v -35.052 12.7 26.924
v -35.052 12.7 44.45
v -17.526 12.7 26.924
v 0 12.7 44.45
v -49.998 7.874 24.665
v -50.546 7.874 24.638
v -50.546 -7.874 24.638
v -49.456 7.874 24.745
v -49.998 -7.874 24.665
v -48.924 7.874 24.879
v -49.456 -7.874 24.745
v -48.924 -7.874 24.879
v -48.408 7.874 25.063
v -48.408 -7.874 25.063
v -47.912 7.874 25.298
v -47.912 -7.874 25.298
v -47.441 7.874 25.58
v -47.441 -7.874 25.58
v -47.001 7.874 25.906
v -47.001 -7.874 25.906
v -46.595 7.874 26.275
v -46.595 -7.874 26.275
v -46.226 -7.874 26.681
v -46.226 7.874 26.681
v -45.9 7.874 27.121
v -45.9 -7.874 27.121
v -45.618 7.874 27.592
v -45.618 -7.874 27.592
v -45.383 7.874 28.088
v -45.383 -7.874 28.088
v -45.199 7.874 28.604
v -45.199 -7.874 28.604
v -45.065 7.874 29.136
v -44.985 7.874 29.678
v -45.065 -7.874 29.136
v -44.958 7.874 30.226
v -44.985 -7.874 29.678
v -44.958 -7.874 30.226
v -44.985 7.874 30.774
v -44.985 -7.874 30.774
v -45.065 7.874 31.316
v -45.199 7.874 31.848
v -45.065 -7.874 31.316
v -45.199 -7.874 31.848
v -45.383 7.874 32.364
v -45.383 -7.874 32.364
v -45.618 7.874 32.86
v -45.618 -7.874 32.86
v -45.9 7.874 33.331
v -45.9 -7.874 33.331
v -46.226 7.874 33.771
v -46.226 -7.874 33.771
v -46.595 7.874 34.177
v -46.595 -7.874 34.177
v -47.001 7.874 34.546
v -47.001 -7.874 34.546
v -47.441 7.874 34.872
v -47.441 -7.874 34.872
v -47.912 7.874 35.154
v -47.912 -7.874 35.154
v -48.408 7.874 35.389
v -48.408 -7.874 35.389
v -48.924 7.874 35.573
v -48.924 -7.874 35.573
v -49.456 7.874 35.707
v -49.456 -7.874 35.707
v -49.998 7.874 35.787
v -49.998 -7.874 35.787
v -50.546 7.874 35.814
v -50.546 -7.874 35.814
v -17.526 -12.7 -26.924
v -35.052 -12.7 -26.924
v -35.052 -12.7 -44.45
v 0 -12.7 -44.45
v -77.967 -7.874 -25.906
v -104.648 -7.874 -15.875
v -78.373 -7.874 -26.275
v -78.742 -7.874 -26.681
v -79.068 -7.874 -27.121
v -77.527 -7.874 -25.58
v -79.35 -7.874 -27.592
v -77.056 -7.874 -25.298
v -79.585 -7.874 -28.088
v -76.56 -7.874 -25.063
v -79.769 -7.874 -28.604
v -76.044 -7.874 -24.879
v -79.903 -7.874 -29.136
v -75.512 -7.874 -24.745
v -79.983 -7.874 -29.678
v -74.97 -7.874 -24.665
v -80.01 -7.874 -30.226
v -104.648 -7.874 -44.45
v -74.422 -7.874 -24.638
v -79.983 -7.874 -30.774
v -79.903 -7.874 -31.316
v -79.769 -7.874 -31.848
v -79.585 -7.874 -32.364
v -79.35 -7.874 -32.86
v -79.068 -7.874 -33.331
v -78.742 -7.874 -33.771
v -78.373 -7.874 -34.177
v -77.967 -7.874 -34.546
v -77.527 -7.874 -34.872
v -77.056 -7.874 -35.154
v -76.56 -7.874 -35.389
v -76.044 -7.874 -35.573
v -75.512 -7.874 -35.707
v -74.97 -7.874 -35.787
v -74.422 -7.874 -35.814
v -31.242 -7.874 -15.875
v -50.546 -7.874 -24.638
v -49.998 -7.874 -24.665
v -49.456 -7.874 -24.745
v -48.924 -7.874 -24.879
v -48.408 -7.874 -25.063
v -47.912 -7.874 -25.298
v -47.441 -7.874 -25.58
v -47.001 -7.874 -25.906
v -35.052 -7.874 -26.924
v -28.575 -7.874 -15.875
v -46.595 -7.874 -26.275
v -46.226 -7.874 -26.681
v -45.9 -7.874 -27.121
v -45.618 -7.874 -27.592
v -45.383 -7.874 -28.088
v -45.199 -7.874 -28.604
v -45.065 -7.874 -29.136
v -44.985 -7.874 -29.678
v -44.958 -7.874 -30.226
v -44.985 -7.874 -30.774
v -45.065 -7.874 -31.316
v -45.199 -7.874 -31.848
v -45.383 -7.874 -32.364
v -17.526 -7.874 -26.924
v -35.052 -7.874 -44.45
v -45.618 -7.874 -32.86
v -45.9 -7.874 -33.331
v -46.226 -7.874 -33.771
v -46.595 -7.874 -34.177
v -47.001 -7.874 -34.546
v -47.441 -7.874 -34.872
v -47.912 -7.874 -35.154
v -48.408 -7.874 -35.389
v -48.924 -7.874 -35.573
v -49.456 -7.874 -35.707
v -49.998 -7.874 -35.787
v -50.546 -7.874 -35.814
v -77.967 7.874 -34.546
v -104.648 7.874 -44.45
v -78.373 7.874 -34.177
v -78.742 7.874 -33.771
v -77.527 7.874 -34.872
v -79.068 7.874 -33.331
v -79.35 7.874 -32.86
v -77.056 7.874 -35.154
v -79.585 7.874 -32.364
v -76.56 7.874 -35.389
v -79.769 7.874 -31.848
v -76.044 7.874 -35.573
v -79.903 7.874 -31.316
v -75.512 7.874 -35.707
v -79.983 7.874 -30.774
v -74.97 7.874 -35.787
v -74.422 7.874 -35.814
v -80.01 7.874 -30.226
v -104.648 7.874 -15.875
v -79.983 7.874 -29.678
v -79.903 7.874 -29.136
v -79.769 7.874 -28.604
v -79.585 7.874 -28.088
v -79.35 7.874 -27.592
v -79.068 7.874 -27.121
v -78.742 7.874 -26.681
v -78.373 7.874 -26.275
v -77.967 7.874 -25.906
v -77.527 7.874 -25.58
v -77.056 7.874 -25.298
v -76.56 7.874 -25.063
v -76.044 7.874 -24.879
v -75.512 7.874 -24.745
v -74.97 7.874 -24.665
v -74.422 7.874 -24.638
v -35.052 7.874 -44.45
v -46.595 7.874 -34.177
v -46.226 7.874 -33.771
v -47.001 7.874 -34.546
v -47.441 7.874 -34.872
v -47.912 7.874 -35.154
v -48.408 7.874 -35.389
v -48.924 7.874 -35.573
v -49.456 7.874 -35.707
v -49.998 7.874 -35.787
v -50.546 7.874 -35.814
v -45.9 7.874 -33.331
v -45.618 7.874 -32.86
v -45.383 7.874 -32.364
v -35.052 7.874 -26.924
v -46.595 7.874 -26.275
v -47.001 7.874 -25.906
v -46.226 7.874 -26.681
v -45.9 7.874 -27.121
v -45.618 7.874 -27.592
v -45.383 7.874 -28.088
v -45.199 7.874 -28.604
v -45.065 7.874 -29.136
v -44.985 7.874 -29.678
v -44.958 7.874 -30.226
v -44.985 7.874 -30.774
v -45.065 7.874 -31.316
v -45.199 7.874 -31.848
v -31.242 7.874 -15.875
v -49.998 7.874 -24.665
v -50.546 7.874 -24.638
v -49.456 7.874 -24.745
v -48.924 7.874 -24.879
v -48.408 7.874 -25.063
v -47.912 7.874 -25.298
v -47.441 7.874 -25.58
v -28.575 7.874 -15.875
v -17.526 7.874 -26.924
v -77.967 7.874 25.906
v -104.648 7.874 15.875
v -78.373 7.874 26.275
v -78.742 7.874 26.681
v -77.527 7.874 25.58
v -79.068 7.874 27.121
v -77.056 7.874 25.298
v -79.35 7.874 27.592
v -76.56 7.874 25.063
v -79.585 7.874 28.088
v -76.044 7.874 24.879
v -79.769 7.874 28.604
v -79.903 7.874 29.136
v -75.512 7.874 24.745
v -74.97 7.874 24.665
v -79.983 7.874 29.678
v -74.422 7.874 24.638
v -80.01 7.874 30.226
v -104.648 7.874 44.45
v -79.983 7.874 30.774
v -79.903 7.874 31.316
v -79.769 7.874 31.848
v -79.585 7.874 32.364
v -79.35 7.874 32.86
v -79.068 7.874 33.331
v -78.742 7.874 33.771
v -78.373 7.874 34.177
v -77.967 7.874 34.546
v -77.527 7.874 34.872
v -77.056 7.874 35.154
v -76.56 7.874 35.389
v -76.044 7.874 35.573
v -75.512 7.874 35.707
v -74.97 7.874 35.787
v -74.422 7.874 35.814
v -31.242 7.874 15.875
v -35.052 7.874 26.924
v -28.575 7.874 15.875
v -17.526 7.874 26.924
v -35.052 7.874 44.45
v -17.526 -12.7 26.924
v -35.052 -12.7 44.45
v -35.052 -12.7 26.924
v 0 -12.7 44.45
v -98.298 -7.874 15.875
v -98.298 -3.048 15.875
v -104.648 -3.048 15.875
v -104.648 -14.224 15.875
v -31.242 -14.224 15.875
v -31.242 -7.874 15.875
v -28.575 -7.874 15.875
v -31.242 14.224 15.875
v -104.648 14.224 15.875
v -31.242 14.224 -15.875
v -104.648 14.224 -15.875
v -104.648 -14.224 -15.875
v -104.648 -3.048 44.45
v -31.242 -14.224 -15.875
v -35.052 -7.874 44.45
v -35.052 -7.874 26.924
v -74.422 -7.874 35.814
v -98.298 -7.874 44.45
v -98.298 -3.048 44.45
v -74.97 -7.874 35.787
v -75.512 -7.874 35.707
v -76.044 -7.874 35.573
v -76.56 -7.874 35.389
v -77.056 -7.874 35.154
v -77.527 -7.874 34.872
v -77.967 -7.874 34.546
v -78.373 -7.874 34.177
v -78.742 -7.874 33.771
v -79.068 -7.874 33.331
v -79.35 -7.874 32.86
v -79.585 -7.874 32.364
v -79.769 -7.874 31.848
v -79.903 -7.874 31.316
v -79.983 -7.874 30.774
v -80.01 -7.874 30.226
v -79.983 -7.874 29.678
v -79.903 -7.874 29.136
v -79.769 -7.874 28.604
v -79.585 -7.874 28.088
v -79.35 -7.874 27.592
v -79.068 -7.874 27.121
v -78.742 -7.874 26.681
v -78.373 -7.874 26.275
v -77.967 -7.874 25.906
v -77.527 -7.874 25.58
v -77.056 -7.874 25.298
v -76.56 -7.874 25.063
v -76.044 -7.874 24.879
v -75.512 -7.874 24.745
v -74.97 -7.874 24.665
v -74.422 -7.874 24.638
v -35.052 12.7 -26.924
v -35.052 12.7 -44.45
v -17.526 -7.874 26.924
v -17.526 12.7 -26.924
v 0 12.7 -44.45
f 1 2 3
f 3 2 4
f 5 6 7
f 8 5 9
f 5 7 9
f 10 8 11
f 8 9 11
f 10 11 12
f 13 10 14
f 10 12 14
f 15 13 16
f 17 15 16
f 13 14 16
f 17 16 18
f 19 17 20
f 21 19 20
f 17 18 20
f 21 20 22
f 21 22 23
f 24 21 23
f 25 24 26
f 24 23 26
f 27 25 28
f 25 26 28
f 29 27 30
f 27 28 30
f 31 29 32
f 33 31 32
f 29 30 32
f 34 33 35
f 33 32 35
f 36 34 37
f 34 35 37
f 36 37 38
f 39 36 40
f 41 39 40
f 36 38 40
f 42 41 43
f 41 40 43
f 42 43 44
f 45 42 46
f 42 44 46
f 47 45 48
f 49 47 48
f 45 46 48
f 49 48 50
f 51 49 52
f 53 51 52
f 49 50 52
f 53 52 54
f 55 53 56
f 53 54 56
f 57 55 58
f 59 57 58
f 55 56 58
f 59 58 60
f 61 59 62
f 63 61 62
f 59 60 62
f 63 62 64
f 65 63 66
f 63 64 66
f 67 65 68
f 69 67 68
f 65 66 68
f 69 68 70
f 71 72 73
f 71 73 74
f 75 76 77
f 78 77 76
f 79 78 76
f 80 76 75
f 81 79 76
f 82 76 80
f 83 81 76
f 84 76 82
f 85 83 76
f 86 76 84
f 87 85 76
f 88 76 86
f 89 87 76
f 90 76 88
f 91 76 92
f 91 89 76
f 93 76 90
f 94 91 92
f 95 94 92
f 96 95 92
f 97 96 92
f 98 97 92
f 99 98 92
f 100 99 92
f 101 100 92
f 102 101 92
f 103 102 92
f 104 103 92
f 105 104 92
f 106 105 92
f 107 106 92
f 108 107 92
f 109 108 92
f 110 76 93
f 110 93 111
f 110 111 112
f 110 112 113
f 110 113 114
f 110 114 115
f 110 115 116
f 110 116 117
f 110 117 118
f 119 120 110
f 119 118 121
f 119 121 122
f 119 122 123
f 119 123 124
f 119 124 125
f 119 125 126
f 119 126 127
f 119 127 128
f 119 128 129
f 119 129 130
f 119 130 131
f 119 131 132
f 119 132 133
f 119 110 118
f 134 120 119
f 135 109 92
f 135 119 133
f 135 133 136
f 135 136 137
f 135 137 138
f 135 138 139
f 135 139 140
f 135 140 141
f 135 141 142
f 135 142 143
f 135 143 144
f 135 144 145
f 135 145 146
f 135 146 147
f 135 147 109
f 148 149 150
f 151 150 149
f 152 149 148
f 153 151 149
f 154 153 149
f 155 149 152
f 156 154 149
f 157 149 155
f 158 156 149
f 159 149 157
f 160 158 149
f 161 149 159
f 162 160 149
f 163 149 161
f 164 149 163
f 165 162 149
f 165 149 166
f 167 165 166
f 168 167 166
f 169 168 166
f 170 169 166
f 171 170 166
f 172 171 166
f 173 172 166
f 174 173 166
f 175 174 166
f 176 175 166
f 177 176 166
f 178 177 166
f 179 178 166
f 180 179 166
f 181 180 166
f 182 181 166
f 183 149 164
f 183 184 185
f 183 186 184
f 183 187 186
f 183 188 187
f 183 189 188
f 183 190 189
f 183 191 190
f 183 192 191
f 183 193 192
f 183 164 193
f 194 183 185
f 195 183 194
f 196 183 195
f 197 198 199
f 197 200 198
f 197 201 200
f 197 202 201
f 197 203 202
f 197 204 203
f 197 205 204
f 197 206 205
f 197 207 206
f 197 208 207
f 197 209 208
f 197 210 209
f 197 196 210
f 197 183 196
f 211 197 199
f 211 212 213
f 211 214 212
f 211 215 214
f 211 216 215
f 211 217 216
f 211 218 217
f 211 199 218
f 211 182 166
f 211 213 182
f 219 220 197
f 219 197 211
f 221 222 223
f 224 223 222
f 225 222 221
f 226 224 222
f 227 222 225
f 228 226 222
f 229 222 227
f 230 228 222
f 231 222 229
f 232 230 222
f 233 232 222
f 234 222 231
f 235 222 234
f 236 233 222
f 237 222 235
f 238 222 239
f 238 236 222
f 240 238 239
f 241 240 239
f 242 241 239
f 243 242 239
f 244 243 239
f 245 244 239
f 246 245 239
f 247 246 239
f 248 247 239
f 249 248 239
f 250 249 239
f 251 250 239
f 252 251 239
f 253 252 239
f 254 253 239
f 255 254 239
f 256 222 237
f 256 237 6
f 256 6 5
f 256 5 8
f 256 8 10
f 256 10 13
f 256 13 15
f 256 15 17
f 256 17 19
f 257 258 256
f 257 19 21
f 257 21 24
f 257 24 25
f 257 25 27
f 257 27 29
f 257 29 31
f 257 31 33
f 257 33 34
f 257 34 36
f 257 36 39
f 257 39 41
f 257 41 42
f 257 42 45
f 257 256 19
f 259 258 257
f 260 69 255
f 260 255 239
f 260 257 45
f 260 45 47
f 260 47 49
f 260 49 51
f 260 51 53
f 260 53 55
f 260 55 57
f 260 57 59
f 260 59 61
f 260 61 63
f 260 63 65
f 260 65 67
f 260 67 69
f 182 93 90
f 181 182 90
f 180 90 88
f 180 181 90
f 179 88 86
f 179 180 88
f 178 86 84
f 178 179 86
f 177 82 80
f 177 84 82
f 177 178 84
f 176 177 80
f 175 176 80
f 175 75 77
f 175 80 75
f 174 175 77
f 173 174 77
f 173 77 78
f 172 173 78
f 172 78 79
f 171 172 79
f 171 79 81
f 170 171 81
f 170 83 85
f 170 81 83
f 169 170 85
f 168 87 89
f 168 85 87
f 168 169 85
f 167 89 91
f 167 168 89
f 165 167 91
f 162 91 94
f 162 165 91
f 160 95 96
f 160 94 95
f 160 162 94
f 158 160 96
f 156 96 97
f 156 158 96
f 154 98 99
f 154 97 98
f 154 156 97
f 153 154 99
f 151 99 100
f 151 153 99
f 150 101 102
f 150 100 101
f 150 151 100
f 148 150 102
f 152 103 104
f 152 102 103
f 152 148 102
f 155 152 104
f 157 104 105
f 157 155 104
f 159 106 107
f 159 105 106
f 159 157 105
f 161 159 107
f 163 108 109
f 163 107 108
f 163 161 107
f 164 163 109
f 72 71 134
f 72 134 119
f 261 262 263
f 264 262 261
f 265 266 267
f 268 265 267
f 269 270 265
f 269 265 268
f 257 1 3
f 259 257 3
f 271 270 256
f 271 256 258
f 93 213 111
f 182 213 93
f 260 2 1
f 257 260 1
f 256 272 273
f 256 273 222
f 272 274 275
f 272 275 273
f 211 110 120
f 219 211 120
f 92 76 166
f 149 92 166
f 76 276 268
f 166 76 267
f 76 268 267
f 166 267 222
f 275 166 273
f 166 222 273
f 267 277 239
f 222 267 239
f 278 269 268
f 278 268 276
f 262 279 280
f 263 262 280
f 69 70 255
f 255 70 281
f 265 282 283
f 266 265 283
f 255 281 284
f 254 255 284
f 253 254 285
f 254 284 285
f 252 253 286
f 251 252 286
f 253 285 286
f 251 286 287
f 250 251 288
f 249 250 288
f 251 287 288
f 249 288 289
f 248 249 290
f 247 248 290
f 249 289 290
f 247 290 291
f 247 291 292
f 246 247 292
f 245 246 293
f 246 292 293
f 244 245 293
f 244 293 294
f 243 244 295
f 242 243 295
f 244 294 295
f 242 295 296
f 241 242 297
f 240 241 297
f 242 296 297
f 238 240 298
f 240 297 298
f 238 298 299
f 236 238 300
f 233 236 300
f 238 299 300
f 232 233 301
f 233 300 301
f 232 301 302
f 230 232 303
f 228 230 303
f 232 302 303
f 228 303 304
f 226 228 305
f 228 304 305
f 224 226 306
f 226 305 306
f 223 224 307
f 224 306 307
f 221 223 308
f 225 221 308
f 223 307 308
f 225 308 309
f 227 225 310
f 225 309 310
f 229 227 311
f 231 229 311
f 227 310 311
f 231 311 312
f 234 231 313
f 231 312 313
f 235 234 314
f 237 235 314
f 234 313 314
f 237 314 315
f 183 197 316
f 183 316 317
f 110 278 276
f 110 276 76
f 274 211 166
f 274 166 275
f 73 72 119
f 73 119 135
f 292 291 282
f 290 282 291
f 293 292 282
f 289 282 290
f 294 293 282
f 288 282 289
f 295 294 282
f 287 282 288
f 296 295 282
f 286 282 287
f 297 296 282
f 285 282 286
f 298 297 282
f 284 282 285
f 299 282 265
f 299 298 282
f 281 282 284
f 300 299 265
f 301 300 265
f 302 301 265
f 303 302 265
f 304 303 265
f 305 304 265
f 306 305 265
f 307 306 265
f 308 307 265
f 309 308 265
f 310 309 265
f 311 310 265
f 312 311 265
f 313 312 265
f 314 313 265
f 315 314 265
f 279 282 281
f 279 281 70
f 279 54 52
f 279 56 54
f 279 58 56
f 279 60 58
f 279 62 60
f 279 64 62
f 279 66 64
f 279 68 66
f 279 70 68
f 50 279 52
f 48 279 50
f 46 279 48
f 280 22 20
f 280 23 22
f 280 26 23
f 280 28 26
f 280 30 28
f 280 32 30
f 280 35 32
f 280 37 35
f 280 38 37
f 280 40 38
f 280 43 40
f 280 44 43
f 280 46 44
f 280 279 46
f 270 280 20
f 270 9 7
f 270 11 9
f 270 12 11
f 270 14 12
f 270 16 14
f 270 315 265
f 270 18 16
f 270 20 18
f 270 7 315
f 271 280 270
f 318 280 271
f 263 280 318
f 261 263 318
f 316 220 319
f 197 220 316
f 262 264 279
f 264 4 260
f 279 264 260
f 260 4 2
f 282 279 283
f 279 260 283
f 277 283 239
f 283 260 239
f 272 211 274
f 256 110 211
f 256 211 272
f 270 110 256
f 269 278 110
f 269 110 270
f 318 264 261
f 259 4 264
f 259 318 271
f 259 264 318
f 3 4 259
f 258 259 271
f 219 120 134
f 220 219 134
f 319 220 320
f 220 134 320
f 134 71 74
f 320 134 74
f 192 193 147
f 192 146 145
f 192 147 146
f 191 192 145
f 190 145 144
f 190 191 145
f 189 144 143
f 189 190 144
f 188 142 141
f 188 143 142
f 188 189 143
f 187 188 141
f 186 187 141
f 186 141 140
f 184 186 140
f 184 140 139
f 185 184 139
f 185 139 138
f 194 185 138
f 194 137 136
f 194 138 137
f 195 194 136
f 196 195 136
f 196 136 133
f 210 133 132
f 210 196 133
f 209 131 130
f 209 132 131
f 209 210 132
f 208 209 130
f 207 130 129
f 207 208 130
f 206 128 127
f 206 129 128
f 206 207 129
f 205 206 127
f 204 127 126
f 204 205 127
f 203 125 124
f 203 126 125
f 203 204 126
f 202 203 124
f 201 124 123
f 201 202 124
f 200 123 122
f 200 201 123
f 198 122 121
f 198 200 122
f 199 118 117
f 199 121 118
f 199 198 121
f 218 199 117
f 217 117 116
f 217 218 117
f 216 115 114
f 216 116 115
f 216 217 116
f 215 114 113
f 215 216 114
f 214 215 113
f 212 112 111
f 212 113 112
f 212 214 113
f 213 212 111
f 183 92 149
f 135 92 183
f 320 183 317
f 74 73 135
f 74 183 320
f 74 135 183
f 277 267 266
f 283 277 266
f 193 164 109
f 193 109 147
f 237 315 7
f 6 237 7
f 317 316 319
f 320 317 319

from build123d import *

# Parameters (mm, degrees)
F1_DEPTH  = 104.648
F2_W      = 6.35
F2_H      = 4.826
F3_DEPTH  = 28.575
F5_DEPTH  = 68.58
F7_DEPTH  = 12.7
F11_DEPTH = 39.116
F12_W     = 31.242
F12_H     = 31.75
F13_DEPTH = 67.31


with BuildPart() as f1:
    # F0 (on Right) → F1 (new body)
    with BuildSketch(Plane.YZ):
        Polygon((-14.224, 15.875), (-14.224, 0), (-14.224, -15.875), (-7.874, -15.875), (-7.874, -44.45), (7.874, -44.45), (7.874, -15.875), (14.224, -15.875), (14.224, 0), (14.224, 15.875), (7.874, 15.875), (7.874, 44.45), (-7.874, 44.45), (-7.874, 15.875), align=None)
    extrude(amount=-F1_DEPTH)

    # F2 (on face) → F3 (cut, through all)
    with BuildSketch(Plane.XY.offset(44.45)):
        with Locations((-101.473, -5.461)):
            Rectangle(F2_W, F2_H)
    extrude(amount=-F3_DEPTH, mode=Mode.SUBTRACT)

    # F4 (on Front) → F5 (cut, symmetric)
    with BuildSketch(Plane.XZ):
        with BuildLine():
            Line((-50.546, -24.638), (-74.422, -24.638))
            ThreePointArc((-74.422, -24.638), (-80.01, -30.226), (-74.422, -35.814))
            Line((-74.422, -35.814), (-50.546, -35.814))
            ThreePointArc((-50.546, -35.814), (-44.958, -30.226), (-50.546, -24.638))
        make_face()
        with BuildLine():
            ThreePointArc((-74.422, 35.814), (-80.01, 30.226), (-74.422, 24.638))
            Line((-74.422, 24.638), (-50.546, 24.638))
            ThreePointArc((-50.546, 24.638), (-44.958, 30.226), (-50.546, 35.814))
            Line((-50.546, 35.814), (-74.422, 35.814))
        make_face()
    extrude(amount=F5_DEPTH, both=True, mode=Mode.SUBTRACT)


with BuildPart() as f7:
    # F6 (on Front) → F7 (new body, symmetric)
    with BuildSketch(Plane.XZ):
        Polygon((0, 44.45), (-35.052, 44.45), (-35.052, 26.924), (-17.526, 26.924), align=None)
        Polygon((0, -44.45), (-17.526, -26.924), (-35.052, -26.924), (-35.052, -44.45), align=None)
    extrude(amount=F7_DEPTH, both=True)

    # F8: union F1
    add(f1.part)

    # F10 (on Front) → F11 (cut, symmetric)
    with BuildSketch(Plane.XZ):
        Polygon((0, 44.45), (-17.526, 26.924), (-28.575, 15.875), (0, 15.875), align=None)
        Polygon((-28.575, -15.875), (-17.526, -26.924), (0, -44.45), (0, -15.875), align=None)
    extrude(amount=F11_DEPTH, both=True, mode=Mode.SUBTRACT)

    # F12 (on Front) → F13 (cut, symmetric)
    with BuildSketch(Plane.XZ):
        with Locations((-15.621, 0)):
            Rectangle(F12_W, F12_H)
    extrude(amount=F13_DEPTH, both=True, mode=Mode.SUBTRACT)


solid = f7.part
